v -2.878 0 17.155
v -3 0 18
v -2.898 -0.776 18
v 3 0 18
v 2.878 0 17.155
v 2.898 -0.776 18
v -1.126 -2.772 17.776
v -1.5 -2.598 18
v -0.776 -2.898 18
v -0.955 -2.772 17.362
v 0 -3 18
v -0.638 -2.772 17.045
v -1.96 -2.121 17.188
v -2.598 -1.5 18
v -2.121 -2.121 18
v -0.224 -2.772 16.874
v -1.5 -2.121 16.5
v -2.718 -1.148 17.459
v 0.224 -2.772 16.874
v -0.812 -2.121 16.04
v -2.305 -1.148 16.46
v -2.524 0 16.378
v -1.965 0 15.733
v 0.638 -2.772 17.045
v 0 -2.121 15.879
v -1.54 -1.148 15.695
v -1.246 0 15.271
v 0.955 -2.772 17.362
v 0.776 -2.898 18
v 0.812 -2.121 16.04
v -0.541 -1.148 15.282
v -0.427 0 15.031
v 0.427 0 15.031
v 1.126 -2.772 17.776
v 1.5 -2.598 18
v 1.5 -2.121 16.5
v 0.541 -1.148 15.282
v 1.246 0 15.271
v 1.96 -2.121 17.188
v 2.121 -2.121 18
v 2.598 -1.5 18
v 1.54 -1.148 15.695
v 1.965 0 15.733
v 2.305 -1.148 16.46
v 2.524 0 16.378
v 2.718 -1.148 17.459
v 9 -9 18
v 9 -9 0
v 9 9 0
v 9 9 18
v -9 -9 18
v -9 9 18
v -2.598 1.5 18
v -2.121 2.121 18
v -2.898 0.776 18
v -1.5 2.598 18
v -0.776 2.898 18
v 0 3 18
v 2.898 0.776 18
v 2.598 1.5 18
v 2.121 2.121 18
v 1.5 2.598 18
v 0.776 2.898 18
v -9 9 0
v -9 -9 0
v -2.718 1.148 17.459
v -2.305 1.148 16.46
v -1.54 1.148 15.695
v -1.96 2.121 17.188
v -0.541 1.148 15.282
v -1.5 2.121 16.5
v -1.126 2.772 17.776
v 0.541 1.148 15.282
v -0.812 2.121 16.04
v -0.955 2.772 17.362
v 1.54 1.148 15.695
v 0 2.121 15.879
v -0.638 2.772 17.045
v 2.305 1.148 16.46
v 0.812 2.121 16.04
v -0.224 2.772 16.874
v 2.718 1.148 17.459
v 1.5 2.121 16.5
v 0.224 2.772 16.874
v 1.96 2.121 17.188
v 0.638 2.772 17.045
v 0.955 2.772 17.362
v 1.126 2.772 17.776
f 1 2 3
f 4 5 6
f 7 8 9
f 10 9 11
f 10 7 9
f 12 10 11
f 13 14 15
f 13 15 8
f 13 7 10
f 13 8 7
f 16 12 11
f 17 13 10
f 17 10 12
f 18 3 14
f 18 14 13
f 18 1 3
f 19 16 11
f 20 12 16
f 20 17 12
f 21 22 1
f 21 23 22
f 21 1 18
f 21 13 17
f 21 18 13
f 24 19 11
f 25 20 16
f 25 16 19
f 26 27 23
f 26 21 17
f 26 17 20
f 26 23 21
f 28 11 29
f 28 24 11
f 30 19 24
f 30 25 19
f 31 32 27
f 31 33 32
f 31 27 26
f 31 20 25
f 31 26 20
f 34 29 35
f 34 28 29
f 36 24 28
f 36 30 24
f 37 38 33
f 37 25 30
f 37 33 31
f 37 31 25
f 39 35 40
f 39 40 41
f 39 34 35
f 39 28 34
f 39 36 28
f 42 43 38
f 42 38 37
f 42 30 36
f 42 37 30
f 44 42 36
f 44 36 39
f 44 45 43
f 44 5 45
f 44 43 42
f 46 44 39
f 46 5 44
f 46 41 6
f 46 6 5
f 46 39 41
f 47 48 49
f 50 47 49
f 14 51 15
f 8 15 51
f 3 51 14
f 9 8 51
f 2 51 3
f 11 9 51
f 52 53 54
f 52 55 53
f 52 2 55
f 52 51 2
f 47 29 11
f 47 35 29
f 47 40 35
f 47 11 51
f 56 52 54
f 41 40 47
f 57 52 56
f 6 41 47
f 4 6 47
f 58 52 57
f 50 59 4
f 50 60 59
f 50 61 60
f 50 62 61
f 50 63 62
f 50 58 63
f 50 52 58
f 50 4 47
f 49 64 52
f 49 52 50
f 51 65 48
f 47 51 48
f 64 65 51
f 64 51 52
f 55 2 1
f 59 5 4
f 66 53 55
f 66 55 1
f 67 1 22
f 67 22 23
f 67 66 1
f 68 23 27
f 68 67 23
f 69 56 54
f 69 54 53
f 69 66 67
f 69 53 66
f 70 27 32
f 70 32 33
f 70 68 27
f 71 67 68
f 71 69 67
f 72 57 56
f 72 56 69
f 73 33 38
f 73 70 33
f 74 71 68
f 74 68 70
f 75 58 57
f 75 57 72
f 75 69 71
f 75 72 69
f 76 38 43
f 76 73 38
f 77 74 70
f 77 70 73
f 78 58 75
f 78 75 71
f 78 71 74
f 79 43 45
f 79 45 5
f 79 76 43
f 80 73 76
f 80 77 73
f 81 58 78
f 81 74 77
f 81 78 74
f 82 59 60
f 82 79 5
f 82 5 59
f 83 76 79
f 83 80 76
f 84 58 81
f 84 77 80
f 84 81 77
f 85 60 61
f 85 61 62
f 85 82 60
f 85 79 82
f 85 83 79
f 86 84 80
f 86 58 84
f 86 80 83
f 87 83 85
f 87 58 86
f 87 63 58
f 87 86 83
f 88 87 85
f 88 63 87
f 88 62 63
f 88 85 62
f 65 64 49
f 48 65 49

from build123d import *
from build123d.topology import SkipClean

# Parameters (mm, degrees)
SKETCH1_W           = 18
SKETCH1_H           = 18
BOSS_EXTRUDE1_DEPTH = 18


with BuildPart() as part:
    # Sketch1 → Boss-Extrude1 (new body)
    with BuildSketch(Plane.XY):
        Rectangle(SKETCH1_W, SKETCH1_H)
    extrude(amount=BOSS_EXTRUDE1_DEPTH)

    # Sketch2 → Cut-Revolve1 (revolve, cut)
    with SkipClean():  # the faces are left unmerged after this step: merging them gives an invalid solid
        with BuildSketch(Plane.XY.offset(18)):
            with BuildLine():
                ThreePointArc((3, 0), (2.121320344, 2.121320344), (0, 3))
                Line((0, 3), (0, -3))
                ThreePointArc((0, -3), (2.121320344, -2.121320344), (3, 0))
            make_face()
            with BuildLine():
                Line((0, -3), (0, 3))
                ThreePointArc((0, 3), (-3, 0), (0, -3))
            make_face()
        revolve(axis=Axis((0, 3, 18), (0, -1, 0)), mode=Mode.SUBTRACT)


solid = part.part
